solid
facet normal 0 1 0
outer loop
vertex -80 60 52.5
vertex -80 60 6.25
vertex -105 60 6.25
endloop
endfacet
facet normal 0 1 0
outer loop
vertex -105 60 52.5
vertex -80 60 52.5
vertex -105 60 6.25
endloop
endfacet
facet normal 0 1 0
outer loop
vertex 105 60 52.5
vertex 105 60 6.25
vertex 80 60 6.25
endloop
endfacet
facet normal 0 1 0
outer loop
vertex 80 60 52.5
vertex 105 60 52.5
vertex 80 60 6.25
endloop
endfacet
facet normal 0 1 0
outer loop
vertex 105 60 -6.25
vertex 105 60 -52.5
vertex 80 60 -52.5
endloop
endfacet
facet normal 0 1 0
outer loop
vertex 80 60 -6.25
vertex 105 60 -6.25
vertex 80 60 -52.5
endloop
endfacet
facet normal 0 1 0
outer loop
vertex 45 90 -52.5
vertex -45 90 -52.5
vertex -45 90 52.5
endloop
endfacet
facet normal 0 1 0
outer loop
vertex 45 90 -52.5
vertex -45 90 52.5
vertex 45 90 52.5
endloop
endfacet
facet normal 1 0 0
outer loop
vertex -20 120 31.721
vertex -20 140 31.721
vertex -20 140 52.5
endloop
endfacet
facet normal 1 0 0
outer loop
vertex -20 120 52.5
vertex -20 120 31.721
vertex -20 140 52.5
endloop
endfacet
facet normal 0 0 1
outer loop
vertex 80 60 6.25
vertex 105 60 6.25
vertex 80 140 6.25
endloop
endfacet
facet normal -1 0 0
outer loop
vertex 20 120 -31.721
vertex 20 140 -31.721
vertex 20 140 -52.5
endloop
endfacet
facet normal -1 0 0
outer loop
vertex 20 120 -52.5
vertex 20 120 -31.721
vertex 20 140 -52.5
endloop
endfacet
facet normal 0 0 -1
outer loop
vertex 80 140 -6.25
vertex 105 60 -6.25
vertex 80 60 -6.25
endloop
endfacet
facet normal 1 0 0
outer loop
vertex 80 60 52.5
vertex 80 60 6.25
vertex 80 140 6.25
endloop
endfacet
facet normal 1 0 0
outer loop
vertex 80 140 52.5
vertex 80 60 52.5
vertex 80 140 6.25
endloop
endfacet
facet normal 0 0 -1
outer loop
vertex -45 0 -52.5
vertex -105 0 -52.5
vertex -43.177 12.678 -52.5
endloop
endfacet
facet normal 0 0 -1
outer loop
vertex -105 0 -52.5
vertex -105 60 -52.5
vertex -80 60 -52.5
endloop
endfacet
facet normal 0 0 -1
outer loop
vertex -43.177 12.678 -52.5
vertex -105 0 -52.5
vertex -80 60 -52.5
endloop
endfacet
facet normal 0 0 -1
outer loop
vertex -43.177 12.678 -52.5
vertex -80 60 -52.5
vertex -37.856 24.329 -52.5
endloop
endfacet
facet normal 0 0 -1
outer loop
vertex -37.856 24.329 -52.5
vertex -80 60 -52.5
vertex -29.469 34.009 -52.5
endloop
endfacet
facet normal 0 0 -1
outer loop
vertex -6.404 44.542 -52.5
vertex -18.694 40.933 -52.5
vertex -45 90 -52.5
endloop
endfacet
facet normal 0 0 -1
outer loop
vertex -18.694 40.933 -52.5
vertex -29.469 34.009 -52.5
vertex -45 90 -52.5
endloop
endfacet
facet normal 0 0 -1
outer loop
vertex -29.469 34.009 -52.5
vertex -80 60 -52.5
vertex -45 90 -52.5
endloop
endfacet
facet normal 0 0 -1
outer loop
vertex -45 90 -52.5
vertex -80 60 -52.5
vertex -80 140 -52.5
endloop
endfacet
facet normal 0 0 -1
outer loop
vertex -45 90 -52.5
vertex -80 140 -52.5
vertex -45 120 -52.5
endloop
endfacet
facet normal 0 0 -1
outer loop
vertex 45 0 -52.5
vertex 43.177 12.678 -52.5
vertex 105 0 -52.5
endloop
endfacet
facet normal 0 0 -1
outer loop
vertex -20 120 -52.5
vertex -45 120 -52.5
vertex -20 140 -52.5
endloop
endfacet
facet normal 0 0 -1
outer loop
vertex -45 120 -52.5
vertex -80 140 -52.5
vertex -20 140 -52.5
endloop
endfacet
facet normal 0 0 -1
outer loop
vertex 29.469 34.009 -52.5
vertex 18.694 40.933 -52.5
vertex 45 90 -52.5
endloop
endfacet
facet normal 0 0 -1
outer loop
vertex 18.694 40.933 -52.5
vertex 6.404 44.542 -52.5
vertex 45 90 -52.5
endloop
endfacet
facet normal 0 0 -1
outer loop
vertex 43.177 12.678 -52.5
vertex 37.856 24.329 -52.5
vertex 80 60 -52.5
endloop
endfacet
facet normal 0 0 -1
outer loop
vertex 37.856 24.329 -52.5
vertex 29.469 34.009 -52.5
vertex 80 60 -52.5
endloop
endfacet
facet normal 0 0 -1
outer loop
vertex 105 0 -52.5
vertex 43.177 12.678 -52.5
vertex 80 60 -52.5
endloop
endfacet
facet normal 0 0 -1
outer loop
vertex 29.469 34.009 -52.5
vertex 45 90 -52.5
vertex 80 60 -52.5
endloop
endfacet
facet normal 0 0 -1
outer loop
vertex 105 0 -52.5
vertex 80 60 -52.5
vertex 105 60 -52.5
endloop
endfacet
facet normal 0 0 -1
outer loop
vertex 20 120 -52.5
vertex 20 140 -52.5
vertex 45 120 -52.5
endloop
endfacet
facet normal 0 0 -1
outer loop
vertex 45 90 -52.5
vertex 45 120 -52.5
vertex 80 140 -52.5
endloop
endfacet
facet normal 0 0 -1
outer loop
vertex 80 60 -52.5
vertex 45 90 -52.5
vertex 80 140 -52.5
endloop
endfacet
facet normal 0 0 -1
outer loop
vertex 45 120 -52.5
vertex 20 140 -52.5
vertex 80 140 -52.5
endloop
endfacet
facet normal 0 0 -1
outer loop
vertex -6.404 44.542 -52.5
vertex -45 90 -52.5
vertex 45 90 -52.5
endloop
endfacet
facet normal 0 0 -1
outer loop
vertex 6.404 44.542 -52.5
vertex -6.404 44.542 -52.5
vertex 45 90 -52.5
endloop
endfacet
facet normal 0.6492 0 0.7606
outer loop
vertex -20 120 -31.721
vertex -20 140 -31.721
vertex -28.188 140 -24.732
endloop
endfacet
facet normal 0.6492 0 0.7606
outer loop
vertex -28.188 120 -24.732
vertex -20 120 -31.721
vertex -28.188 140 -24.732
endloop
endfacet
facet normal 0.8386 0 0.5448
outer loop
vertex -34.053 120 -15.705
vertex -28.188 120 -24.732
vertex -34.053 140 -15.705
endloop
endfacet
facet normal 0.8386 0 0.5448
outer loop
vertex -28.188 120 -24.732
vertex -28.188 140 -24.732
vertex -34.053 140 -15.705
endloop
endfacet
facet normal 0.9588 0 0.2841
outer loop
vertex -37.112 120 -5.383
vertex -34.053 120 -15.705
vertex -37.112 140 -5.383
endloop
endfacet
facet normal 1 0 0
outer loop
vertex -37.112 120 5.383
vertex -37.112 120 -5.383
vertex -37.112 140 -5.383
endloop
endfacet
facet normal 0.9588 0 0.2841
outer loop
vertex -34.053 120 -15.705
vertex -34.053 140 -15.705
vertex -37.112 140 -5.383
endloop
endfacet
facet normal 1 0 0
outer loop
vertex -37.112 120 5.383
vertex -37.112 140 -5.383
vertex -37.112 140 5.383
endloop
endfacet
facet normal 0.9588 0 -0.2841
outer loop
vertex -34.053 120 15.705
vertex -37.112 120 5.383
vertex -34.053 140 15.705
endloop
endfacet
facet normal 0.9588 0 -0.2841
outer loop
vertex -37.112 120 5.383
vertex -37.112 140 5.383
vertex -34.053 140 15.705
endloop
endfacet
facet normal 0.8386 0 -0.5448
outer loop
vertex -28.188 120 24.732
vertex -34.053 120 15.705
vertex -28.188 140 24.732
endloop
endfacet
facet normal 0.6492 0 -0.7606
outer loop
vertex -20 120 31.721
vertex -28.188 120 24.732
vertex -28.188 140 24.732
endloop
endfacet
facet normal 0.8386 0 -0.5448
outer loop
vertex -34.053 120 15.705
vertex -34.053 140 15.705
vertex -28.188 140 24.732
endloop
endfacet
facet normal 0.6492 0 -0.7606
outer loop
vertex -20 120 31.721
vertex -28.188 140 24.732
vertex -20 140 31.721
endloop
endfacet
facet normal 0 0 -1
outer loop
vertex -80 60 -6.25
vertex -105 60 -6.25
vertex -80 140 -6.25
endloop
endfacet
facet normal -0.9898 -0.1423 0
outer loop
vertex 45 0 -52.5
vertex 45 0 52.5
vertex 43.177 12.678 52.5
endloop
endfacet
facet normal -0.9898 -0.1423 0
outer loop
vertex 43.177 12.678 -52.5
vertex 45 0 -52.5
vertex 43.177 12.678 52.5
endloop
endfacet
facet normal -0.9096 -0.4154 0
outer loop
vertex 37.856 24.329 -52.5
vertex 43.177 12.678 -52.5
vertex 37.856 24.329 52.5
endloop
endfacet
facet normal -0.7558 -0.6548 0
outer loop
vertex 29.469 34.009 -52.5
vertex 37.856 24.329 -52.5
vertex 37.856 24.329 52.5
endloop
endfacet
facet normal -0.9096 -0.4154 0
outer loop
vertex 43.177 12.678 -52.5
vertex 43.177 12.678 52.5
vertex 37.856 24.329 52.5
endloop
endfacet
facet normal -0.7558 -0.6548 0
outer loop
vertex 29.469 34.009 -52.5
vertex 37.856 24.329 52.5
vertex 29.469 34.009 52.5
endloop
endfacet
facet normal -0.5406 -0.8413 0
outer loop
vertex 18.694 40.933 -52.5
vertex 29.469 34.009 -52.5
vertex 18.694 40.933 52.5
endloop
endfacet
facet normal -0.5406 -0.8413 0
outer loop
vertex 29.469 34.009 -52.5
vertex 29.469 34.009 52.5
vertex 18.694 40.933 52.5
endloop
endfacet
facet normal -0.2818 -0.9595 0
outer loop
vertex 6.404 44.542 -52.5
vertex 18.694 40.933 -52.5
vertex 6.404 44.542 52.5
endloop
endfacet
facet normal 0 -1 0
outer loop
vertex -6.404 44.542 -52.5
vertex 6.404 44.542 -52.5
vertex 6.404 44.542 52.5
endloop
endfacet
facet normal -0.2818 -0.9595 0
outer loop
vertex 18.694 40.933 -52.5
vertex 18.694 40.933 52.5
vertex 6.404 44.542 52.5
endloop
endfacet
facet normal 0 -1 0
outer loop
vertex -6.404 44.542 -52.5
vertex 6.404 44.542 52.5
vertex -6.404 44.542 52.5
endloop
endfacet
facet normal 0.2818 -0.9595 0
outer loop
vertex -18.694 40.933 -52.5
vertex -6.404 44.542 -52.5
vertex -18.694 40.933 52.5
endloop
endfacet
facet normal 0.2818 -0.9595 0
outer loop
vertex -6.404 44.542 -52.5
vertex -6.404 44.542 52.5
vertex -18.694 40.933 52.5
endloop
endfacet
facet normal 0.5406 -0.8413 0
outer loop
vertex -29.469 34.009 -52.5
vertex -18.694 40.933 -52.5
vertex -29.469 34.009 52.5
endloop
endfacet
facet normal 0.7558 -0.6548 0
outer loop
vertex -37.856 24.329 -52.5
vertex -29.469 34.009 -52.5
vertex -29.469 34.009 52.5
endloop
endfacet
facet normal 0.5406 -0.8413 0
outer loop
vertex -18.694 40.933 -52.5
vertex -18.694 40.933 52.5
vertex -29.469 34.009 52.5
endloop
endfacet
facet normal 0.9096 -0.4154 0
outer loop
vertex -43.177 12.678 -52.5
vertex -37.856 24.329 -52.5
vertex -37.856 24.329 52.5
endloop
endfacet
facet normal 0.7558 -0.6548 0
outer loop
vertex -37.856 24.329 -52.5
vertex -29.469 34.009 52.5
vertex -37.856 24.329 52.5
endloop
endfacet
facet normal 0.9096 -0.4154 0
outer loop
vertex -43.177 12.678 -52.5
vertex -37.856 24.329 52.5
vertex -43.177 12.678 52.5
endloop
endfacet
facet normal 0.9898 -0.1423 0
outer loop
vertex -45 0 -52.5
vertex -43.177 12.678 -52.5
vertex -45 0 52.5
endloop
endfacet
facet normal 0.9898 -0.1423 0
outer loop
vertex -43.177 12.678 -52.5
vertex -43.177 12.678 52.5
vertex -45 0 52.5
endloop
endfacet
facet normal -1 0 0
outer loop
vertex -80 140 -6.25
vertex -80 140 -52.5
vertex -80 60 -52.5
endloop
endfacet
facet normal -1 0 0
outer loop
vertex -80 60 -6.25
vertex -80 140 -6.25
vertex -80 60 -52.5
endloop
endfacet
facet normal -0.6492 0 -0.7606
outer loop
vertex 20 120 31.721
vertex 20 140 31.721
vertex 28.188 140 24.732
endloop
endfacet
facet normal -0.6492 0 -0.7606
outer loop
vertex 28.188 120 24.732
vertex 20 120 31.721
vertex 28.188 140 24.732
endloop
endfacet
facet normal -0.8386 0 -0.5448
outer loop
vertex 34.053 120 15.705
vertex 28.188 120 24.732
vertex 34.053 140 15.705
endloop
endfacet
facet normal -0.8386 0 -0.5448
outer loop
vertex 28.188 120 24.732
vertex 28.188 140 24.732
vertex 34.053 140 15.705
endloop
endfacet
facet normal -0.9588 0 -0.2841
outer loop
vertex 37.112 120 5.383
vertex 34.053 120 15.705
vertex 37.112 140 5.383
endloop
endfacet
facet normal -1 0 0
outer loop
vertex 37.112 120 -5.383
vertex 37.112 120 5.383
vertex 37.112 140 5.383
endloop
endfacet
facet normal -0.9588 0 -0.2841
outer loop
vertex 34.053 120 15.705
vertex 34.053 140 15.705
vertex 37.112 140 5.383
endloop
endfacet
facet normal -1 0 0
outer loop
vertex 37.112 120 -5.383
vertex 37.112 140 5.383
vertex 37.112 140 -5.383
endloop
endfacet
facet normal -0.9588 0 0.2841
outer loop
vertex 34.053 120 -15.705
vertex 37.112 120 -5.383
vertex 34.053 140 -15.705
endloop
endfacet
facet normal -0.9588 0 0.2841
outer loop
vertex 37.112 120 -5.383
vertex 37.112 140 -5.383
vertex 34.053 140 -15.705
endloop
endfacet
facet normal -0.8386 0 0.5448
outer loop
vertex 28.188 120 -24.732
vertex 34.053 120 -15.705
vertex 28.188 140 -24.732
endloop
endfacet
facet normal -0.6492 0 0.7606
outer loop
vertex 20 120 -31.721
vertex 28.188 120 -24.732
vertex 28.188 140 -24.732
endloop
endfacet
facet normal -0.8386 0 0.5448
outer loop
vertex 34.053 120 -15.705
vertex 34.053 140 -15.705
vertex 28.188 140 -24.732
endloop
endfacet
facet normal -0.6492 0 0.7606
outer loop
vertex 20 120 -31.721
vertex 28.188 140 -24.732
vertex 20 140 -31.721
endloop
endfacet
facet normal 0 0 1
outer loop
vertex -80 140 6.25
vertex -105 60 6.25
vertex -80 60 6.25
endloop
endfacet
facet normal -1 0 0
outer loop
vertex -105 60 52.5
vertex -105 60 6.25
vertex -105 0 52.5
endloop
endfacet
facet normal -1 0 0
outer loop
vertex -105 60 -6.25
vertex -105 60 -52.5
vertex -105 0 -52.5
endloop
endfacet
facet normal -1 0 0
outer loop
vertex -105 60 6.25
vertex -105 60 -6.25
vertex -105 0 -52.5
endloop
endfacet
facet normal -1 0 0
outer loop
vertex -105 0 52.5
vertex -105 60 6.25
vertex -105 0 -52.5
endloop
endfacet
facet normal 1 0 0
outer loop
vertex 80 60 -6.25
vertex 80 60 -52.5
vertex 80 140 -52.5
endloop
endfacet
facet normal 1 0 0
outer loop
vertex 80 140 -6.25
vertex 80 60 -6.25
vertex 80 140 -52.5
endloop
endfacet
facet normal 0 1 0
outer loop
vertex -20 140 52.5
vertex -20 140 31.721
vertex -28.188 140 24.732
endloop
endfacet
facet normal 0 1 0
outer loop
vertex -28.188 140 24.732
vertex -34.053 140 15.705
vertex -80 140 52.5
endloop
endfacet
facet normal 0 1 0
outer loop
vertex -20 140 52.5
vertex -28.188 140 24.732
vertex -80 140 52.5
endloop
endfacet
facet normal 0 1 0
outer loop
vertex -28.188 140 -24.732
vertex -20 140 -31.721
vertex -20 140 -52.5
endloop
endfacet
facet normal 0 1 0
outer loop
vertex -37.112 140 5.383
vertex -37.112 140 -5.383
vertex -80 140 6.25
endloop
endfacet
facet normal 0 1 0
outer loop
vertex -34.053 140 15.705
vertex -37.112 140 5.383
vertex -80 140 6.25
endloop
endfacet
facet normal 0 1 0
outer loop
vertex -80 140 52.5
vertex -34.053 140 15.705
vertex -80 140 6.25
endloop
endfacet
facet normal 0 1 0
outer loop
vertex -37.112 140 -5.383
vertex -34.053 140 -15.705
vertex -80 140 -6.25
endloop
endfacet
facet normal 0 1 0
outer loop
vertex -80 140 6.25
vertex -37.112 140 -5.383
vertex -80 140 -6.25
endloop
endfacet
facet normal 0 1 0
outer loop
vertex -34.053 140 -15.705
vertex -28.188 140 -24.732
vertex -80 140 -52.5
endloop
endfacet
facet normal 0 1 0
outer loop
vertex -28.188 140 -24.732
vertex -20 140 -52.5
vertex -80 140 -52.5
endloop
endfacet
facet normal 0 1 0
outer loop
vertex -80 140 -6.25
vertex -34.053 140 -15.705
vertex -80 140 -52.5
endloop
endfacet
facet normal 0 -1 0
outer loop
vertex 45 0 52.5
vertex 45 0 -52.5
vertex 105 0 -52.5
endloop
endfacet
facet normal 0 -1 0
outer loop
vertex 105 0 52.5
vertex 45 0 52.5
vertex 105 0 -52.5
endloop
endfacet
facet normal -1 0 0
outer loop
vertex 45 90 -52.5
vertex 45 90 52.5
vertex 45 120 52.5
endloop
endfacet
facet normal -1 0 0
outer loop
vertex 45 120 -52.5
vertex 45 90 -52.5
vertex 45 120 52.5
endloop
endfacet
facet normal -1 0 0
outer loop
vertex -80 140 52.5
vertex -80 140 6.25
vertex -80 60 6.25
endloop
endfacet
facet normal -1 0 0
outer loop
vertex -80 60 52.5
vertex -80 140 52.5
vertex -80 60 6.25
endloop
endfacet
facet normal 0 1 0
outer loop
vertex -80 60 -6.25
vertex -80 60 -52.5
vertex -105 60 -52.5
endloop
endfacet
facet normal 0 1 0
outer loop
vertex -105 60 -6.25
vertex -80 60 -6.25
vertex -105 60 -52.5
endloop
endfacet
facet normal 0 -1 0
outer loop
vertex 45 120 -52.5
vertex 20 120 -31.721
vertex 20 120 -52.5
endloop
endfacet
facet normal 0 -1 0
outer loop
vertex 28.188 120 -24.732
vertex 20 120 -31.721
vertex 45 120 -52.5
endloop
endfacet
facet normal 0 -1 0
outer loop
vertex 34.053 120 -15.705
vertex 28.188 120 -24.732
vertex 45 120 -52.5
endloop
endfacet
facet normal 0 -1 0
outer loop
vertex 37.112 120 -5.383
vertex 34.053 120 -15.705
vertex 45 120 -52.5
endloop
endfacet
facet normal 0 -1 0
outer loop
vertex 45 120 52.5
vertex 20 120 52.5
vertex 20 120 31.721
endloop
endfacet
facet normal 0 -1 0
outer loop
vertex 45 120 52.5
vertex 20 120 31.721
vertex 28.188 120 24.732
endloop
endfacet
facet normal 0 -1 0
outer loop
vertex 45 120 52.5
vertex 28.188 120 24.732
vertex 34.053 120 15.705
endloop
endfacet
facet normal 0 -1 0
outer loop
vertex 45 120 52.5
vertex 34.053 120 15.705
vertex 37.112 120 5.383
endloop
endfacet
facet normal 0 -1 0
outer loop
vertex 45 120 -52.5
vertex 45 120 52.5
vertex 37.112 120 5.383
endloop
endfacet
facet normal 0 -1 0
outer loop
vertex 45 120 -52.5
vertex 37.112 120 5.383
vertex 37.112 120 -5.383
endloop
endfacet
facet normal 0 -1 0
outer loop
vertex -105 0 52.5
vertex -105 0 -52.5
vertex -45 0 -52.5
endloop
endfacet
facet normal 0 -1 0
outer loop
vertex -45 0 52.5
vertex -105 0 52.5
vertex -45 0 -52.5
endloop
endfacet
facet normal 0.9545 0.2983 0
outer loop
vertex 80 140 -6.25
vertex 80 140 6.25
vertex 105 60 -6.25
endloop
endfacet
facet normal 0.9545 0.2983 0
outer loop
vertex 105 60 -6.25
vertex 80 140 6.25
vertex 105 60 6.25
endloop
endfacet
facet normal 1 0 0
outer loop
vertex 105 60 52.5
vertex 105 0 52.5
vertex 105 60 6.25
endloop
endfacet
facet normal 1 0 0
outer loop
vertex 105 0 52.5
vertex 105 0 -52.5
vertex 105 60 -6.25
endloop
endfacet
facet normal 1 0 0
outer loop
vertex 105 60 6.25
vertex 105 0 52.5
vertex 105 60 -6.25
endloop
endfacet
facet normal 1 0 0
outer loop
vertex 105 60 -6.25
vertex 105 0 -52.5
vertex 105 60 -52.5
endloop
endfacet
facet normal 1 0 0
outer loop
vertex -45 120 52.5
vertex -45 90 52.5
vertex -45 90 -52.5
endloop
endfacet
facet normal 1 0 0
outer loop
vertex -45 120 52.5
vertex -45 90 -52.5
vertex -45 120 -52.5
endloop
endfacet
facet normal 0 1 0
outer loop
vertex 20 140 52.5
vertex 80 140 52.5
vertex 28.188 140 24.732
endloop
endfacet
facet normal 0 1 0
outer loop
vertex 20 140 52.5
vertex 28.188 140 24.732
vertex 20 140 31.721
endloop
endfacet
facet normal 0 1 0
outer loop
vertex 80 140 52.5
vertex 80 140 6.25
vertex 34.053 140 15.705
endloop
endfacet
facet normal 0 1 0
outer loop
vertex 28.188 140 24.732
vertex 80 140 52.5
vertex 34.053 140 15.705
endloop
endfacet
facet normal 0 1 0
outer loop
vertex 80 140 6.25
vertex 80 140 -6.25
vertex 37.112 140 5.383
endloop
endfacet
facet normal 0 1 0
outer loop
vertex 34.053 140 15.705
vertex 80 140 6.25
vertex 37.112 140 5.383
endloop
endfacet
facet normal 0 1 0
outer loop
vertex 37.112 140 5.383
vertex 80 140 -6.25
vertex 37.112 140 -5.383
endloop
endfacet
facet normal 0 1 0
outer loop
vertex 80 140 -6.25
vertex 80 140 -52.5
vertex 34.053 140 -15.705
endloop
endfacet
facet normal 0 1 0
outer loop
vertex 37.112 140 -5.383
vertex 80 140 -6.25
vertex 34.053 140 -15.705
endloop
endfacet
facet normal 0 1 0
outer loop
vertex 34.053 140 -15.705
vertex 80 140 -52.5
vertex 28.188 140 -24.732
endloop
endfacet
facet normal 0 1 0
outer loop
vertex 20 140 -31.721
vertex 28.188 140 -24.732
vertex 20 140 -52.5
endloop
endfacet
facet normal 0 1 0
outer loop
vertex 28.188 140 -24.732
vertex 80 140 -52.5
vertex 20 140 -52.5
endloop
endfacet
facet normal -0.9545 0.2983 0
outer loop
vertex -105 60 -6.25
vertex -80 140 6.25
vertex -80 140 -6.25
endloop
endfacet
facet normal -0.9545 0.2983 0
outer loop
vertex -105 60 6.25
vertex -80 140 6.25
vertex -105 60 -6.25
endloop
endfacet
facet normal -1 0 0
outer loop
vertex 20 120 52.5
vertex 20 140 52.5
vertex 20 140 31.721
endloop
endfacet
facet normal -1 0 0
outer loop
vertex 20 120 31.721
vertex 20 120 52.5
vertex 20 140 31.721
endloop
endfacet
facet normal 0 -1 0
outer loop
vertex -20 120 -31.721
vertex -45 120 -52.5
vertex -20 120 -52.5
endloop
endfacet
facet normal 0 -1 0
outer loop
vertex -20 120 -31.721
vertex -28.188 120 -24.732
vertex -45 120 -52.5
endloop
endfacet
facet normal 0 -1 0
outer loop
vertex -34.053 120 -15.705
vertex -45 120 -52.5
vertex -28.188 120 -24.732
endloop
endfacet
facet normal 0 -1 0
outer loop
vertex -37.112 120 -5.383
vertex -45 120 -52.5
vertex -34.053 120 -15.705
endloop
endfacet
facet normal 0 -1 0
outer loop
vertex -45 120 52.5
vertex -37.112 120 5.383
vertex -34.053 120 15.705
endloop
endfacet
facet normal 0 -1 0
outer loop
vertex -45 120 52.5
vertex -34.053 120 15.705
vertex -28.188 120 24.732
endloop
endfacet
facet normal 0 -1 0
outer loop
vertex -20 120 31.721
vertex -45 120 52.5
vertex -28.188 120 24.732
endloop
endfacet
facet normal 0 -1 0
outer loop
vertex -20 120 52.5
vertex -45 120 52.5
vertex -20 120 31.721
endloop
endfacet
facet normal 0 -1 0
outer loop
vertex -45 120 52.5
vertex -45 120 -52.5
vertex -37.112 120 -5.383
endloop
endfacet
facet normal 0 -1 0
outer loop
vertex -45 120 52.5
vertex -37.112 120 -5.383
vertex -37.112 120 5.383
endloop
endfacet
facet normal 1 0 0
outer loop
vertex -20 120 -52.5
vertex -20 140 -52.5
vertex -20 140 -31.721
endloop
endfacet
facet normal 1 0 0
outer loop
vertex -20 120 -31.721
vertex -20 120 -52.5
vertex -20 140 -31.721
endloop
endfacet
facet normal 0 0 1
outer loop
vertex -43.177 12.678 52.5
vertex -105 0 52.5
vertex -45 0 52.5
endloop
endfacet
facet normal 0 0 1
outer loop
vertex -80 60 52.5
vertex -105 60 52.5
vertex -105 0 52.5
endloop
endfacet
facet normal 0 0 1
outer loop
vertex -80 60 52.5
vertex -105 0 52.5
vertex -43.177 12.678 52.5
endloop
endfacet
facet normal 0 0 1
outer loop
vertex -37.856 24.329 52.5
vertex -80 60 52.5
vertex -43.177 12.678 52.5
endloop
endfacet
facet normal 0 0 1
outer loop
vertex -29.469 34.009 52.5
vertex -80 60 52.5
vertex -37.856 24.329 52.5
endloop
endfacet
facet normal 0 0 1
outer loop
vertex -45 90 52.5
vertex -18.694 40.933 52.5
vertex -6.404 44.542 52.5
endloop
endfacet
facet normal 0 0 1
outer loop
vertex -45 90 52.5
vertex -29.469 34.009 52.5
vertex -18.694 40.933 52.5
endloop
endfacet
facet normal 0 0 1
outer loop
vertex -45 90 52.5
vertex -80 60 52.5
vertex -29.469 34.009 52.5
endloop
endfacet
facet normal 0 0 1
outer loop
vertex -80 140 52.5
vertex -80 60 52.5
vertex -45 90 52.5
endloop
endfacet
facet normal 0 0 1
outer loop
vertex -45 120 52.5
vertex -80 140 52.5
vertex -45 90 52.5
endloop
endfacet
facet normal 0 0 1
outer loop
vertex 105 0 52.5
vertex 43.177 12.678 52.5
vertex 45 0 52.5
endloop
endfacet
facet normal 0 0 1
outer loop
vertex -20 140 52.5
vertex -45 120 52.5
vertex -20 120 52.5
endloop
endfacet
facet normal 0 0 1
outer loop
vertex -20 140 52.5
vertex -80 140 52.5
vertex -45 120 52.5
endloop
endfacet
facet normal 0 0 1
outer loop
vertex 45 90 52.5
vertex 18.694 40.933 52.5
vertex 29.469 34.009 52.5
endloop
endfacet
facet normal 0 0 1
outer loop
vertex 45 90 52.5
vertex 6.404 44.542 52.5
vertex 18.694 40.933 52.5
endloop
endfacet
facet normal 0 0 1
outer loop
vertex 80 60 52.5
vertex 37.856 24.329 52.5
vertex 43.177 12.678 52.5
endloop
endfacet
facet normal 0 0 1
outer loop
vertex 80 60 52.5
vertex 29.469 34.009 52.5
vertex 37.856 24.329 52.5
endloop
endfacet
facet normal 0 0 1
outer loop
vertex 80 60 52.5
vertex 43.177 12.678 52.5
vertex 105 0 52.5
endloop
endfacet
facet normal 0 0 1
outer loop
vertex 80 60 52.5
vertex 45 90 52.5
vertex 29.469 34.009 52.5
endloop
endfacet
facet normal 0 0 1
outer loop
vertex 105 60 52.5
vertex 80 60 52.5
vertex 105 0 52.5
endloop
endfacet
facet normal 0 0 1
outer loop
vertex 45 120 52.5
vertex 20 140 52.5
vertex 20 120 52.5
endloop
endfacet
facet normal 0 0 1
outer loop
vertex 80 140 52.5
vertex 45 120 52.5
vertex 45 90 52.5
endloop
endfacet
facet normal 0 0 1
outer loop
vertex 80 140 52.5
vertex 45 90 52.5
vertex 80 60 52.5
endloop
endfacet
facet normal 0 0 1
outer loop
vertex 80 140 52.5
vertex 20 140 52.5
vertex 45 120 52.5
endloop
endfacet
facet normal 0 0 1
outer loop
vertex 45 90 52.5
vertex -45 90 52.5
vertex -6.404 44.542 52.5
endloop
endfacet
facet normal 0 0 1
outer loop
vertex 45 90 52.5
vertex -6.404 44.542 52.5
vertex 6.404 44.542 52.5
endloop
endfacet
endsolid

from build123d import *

# Parameters (mm, degrees)
BOSS_EXTRUDE1_DEPTH      = 52.5
BOSS_EXTRUDE1_DEPTH_BACK = 52.5
CUT_EXTRUDE1_DEPTH       = 205.08331632
SKETCH3_W                = 90
SKETCH3_H                = 30
CUT_EXTRUDE2_DEPTH       = 205.08331632
CUT_EXTRUDE3_REACH       = 184.705
BOSS_EXTRUDE2_DEPTH      = 6.25


with BuildPart() as part:
    # Sketch1 → Boss-Extrude1 (new, two sides: drawn at the far end of the back side and taken through both)
    with BuildSketch(Plane.XY.offset(-BOSS_EXTRUDE1_DEPTH_BACK)):
        Polygon((-105, 0), (105, 0), (105, 60), (80, 60), (80, 140), (-80, 140), (-80, 60), (-105, 60), align=None)
    extrude(amount=BOSS_EXTRUDE1_DEPTH + BOSS_EXTRUDE1_DEPTH_BACK)

    # Sketch2 → Cut-Extrude1 (cut, through all)
    with BuildSketch(Plane.XY.offset(52.5)):
        with BuildLine():
            Line((-45, 0), (45, 0))
            ThreePointArc((45, 0), (0, 45), (-45, 0))
        make_face()
    extrude(amount=-CUT_EXTRUDE1_DEPTH, mode=Mode.SUBTRACT)

    # Sketch3 → Cut-Extrude2 (cut, through all)
    with BuildSketch(Plane.XY.offset(52.5)):
        with Locations((0, 105)):
            Rectangle(SKETCH3_W, SKETCH3_H)
    extrude(amount=-CUT_EXTRUDE2_DEPTH, mode=Mode.SUBTRACT)

    # Sketch5 → Cut-Extrude3 (cut, up to next)
    with BuildSketch(Plane(origin=(0, 140, 0), x_dir=(1, 0, 0), z_dir=(0, 1, 0)), mode=Mode.PRIVATE) as cut_extrude3_sk1:
        with BuildLine():
            Line((-20, 52.5), (-20, 31.721443851))
            ThreePointArc((-20, 31.721443851), (-37.5, 0), (-20, -31.721443851))
            Line((-20, -31.721443851), (-20, -52.5))
            Line((-20, -52.5), (20, -52.5))
            Line((20, -52.5), (20, -31.721443851))
            ThreePointArc((20, -31.721443851), (37.5, 0), (20, 31.721443851))
            Line((20, 31.721443851), (20, 52.5))
            Line((20, 52.5), (-20, 52.5))
        make_face()
    cut_extrude3_tool1 = extrude(cut_extrude3_sk1.sketch, amount=-CUT_EXTRUDE3_REACH, mode=Mode.PRIVATE) & part.part
    add(cut_extrude3_tool1.solids().sort_by_distance((0, 140, 0))[0], mode=Mode.SUBTRACT)

    # Sketch6 → Boss-Extrude2 (add, symmetric)
    with BuildSketch(Plane.XY):
        Polygon((80, 140), (105, 60), (80, 60), align=None)
    boss_extrude2 = extrude(amount=BOSS_EXTRUDE2_DEPTH, both=True)

    # Mirror1: Boss-Extrude2 across plane
    add(boss_extrude2.mirror(Plane(origin=(0, 0, 0), x_dir=(0, 0, 1), z_dir=(1, 0, 0))))


solid = part.part
